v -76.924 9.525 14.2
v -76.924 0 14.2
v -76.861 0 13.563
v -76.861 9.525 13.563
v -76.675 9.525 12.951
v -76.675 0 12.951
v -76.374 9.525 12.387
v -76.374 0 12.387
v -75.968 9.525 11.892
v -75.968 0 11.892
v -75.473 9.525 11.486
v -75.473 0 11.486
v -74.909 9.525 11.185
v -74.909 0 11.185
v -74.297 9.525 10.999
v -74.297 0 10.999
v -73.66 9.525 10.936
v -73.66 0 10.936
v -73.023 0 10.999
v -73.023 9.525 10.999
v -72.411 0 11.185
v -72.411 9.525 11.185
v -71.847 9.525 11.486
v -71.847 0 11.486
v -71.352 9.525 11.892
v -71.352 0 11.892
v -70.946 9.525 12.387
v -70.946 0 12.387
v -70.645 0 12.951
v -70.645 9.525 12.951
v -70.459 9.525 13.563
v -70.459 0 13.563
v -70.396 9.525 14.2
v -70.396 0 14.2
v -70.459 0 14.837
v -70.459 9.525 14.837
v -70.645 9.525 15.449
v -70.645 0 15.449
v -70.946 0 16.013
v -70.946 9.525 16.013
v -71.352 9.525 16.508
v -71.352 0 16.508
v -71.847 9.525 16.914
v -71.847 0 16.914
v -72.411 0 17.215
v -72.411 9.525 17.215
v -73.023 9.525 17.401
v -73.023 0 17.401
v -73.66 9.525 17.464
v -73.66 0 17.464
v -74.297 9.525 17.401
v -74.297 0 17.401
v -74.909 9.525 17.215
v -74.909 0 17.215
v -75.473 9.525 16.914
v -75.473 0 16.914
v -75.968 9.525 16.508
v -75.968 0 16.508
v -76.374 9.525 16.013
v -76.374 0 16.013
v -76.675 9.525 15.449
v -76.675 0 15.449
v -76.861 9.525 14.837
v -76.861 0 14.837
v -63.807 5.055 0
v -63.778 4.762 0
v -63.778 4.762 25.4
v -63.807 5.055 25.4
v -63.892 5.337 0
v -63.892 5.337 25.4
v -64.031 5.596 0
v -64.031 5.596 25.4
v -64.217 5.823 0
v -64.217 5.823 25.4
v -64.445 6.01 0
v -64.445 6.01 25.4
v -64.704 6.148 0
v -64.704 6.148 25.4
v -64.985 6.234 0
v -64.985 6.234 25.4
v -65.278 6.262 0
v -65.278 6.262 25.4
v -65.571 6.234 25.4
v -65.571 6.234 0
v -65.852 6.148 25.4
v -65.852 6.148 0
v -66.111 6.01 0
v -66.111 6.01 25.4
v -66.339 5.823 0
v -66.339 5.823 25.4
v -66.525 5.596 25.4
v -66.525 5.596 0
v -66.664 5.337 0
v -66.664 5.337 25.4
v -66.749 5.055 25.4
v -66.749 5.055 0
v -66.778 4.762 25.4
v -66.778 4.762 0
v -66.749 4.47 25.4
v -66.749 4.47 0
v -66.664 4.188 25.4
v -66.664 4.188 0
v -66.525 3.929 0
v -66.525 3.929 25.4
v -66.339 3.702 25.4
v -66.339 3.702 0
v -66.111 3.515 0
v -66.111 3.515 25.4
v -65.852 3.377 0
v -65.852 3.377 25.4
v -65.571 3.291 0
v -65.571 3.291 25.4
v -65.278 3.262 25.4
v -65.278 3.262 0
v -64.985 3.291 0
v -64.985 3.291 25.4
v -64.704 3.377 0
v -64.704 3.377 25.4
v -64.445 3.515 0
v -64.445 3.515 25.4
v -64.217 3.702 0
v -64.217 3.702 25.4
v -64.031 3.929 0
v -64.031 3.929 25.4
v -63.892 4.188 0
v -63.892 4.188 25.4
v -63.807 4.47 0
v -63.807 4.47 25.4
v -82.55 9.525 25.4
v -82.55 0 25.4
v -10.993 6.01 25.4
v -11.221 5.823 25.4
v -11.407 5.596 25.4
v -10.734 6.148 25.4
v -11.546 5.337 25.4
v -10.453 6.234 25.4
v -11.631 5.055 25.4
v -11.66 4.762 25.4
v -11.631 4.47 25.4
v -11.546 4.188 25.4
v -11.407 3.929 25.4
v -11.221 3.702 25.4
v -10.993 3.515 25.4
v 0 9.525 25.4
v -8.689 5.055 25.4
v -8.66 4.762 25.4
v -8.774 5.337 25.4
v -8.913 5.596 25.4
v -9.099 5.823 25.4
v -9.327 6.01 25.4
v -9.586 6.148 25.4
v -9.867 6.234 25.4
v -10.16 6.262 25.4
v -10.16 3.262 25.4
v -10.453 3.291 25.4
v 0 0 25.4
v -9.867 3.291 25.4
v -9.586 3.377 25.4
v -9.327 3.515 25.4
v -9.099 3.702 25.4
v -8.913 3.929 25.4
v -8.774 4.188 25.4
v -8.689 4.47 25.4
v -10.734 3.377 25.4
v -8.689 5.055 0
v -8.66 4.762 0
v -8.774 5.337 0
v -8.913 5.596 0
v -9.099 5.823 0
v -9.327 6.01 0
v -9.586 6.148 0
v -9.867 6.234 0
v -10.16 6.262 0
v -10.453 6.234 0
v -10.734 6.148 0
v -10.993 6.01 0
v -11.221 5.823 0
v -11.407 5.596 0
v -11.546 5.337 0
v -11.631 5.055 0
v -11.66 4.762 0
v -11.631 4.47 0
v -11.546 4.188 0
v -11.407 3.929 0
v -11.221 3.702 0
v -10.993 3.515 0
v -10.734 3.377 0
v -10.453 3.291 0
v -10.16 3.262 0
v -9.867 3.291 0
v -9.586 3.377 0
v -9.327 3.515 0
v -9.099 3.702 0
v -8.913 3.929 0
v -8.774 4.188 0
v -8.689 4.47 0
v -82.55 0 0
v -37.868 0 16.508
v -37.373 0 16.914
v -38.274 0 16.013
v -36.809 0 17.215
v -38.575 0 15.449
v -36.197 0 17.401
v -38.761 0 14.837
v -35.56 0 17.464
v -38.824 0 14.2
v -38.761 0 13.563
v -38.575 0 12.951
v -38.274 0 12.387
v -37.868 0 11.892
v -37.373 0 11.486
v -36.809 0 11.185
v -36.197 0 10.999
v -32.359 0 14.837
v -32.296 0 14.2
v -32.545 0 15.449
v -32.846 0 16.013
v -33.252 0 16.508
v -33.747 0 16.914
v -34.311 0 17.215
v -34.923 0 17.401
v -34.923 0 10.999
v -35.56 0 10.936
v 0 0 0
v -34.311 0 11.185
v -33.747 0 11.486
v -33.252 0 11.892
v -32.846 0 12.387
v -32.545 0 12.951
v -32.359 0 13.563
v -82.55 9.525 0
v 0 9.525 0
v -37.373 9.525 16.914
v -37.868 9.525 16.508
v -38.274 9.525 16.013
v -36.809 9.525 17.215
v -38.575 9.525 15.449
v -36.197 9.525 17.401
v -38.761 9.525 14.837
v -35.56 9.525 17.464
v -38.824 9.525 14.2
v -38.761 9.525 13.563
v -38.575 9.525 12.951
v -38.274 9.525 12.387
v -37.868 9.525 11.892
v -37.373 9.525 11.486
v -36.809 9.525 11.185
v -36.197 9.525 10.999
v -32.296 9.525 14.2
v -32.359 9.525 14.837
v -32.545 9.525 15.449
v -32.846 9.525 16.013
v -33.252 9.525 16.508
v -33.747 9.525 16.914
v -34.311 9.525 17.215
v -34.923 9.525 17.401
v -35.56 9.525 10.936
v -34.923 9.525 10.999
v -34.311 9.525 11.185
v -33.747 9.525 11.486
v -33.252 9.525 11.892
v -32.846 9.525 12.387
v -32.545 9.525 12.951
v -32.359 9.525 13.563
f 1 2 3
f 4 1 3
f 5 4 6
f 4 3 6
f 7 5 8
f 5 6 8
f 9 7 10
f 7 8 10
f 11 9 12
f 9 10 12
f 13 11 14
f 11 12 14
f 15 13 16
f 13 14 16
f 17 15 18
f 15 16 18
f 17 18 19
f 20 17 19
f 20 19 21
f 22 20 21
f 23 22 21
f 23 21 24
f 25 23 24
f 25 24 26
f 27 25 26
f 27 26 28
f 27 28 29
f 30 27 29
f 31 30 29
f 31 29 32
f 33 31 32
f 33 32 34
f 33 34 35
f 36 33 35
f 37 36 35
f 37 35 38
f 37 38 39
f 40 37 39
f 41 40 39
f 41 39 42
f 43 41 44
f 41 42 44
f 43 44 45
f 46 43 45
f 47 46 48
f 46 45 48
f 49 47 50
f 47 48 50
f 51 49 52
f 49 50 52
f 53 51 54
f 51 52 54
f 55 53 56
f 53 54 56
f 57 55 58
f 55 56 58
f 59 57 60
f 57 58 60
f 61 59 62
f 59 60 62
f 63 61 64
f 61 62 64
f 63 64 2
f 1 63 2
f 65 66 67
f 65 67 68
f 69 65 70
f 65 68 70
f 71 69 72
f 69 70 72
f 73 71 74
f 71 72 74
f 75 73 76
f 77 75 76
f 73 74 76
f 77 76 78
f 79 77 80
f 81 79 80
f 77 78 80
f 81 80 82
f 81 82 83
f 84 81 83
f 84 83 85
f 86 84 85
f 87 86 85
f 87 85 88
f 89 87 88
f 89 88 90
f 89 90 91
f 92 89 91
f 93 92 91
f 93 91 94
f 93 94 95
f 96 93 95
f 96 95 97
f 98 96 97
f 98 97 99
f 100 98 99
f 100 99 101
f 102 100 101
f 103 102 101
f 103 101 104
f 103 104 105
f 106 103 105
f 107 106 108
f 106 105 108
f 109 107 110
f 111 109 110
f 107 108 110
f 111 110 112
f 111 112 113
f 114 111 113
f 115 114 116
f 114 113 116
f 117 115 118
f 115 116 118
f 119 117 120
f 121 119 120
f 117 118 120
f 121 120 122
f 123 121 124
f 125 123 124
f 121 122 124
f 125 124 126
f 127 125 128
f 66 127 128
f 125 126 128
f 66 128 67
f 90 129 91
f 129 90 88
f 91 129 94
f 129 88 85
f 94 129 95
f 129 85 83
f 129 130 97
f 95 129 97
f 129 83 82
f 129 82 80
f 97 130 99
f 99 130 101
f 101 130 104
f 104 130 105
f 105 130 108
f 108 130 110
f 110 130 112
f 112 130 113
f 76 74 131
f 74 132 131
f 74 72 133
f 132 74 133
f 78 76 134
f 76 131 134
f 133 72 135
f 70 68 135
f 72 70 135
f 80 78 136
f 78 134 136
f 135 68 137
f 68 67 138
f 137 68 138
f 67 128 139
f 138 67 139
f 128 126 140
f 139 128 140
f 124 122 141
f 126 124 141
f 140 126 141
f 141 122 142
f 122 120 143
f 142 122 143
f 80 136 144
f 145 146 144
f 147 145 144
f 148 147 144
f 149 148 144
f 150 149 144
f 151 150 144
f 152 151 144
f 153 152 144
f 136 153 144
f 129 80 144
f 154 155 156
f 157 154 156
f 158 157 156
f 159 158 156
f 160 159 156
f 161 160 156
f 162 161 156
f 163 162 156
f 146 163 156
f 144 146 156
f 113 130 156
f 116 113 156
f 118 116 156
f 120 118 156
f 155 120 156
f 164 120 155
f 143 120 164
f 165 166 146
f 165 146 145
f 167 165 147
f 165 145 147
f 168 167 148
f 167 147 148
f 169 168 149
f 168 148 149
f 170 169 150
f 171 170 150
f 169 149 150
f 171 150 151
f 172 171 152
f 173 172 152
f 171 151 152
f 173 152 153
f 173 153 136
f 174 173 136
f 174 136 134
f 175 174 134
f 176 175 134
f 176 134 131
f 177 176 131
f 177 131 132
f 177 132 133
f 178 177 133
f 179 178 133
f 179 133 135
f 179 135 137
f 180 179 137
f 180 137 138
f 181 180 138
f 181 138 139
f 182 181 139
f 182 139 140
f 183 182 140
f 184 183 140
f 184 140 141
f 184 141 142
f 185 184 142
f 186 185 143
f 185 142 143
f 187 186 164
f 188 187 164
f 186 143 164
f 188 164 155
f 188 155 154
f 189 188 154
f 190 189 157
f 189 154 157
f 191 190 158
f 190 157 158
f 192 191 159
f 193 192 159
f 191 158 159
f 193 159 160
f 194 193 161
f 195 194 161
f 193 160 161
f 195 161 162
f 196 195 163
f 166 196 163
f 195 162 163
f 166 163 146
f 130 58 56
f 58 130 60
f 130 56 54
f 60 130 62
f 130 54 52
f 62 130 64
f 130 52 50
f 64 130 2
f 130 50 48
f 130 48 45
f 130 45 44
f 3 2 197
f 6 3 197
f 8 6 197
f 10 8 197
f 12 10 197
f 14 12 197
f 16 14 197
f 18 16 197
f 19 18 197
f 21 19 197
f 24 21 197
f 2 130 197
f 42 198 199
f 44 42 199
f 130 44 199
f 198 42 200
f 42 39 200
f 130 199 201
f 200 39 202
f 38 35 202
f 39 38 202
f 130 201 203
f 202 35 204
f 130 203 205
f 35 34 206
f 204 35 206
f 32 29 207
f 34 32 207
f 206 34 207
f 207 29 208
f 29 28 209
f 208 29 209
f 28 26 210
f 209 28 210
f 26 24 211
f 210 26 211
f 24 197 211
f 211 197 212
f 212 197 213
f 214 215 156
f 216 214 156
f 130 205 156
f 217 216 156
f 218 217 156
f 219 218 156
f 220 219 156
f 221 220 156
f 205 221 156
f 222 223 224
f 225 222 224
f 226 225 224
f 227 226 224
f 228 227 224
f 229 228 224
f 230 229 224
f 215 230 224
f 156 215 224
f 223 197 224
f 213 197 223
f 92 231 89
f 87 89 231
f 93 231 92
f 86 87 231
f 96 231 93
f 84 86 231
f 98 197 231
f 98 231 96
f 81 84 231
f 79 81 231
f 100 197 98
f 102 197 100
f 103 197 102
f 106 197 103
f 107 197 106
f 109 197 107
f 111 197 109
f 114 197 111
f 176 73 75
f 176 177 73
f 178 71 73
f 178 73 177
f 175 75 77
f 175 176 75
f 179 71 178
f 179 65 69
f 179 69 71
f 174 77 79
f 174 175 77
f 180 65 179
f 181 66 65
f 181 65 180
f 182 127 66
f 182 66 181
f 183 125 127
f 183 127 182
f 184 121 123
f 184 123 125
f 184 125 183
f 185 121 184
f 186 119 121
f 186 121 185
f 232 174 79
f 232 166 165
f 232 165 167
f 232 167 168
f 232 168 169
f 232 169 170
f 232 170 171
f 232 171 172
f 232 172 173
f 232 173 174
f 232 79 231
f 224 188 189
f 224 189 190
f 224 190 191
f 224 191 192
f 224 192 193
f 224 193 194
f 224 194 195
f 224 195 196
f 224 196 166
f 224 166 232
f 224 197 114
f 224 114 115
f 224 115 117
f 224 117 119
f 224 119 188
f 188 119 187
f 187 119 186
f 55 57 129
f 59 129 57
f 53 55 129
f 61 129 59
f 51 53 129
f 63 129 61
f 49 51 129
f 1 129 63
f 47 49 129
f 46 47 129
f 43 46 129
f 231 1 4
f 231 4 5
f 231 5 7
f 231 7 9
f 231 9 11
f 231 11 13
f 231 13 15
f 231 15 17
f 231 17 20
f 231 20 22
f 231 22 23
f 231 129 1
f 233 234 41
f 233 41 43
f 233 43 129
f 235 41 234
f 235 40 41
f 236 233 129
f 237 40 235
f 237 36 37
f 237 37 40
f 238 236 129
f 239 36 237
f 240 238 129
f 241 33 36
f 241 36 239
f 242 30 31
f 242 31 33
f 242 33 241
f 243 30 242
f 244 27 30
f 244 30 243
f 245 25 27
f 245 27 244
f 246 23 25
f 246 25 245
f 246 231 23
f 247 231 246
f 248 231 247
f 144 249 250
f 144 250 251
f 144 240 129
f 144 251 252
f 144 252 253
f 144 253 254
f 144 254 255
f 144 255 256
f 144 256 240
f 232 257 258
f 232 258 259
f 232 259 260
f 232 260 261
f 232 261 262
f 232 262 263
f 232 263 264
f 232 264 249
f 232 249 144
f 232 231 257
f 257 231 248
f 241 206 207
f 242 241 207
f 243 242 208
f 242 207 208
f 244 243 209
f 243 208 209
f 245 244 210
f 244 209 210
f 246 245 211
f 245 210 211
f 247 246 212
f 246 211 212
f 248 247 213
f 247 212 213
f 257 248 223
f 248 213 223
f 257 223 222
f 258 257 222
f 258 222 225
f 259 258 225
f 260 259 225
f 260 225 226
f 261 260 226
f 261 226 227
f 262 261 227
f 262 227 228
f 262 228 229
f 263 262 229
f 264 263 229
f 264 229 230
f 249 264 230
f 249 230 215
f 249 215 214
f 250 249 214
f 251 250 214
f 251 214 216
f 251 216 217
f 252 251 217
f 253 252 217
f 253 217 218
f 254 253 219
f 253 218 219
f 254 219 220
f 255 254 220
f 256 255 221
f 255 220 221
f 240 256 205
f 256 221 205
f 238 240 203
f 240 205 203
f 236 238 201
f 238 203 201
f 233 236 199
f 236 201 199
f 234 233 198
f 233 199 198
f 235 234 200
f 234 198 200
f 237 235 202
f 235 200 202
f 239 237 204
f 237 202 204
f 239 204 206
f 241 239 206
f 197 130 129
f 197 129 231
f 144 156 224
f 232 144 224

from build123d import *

# Parameters (mm, degrees)
SKETCH1_W               = 82.55
SKETCH1_H               = 25.4
BOSS_EXTRUDE1_DEPTH     = 9.525
F_1_4_CLEARANCE_HOLE1_D = 6.5278
SKETCH15_R              = 1.5
CUT_EXTRUDE1_DEPTH      = 26.4


with BuildPart() as part:
    # Sketch1 → Boss-Extrude1 (new body)
    with BuildSketch(Plane(origin=(0, 0, 0), x_dir=(1, 0, 0), z_dir=(0, 1, 0))):
        with Locations((-41.275, -12.7)):
            Rectangle(SKETCH1_W, SKETCH1_H)
    extrude(amount=BOSS_EXTRUDE1_DEPTH)

    # 1/4 Clearance Hole1 (through all)
    with Locations(Plane(origin=(0, 9.525, 0), x_dir=(1, 0, 0), z_dir=(0, 1, 0))):
        with Locations((-73.66, -14.200000048), (-35.56, -14.200000048)):
            Hole(F_1_4_CLEARANCE_HOLE1_D / 2)

    # Sketch15 → Cut-Extrude1 (cut, through all)
    with BuildSketch(Plane.XY.offset(25.4)):
        with Locations((-65.278, 4.7625)):
            Circle(SKETCH15_R)
        with Locations((-10.16, 4.7625)):
            Circle(SKETCH15_R)
    extrude(amount=-CUT_EXTRUDE1_DEPTH, mode=Mode.SUBTRACT)


solid = part.part
